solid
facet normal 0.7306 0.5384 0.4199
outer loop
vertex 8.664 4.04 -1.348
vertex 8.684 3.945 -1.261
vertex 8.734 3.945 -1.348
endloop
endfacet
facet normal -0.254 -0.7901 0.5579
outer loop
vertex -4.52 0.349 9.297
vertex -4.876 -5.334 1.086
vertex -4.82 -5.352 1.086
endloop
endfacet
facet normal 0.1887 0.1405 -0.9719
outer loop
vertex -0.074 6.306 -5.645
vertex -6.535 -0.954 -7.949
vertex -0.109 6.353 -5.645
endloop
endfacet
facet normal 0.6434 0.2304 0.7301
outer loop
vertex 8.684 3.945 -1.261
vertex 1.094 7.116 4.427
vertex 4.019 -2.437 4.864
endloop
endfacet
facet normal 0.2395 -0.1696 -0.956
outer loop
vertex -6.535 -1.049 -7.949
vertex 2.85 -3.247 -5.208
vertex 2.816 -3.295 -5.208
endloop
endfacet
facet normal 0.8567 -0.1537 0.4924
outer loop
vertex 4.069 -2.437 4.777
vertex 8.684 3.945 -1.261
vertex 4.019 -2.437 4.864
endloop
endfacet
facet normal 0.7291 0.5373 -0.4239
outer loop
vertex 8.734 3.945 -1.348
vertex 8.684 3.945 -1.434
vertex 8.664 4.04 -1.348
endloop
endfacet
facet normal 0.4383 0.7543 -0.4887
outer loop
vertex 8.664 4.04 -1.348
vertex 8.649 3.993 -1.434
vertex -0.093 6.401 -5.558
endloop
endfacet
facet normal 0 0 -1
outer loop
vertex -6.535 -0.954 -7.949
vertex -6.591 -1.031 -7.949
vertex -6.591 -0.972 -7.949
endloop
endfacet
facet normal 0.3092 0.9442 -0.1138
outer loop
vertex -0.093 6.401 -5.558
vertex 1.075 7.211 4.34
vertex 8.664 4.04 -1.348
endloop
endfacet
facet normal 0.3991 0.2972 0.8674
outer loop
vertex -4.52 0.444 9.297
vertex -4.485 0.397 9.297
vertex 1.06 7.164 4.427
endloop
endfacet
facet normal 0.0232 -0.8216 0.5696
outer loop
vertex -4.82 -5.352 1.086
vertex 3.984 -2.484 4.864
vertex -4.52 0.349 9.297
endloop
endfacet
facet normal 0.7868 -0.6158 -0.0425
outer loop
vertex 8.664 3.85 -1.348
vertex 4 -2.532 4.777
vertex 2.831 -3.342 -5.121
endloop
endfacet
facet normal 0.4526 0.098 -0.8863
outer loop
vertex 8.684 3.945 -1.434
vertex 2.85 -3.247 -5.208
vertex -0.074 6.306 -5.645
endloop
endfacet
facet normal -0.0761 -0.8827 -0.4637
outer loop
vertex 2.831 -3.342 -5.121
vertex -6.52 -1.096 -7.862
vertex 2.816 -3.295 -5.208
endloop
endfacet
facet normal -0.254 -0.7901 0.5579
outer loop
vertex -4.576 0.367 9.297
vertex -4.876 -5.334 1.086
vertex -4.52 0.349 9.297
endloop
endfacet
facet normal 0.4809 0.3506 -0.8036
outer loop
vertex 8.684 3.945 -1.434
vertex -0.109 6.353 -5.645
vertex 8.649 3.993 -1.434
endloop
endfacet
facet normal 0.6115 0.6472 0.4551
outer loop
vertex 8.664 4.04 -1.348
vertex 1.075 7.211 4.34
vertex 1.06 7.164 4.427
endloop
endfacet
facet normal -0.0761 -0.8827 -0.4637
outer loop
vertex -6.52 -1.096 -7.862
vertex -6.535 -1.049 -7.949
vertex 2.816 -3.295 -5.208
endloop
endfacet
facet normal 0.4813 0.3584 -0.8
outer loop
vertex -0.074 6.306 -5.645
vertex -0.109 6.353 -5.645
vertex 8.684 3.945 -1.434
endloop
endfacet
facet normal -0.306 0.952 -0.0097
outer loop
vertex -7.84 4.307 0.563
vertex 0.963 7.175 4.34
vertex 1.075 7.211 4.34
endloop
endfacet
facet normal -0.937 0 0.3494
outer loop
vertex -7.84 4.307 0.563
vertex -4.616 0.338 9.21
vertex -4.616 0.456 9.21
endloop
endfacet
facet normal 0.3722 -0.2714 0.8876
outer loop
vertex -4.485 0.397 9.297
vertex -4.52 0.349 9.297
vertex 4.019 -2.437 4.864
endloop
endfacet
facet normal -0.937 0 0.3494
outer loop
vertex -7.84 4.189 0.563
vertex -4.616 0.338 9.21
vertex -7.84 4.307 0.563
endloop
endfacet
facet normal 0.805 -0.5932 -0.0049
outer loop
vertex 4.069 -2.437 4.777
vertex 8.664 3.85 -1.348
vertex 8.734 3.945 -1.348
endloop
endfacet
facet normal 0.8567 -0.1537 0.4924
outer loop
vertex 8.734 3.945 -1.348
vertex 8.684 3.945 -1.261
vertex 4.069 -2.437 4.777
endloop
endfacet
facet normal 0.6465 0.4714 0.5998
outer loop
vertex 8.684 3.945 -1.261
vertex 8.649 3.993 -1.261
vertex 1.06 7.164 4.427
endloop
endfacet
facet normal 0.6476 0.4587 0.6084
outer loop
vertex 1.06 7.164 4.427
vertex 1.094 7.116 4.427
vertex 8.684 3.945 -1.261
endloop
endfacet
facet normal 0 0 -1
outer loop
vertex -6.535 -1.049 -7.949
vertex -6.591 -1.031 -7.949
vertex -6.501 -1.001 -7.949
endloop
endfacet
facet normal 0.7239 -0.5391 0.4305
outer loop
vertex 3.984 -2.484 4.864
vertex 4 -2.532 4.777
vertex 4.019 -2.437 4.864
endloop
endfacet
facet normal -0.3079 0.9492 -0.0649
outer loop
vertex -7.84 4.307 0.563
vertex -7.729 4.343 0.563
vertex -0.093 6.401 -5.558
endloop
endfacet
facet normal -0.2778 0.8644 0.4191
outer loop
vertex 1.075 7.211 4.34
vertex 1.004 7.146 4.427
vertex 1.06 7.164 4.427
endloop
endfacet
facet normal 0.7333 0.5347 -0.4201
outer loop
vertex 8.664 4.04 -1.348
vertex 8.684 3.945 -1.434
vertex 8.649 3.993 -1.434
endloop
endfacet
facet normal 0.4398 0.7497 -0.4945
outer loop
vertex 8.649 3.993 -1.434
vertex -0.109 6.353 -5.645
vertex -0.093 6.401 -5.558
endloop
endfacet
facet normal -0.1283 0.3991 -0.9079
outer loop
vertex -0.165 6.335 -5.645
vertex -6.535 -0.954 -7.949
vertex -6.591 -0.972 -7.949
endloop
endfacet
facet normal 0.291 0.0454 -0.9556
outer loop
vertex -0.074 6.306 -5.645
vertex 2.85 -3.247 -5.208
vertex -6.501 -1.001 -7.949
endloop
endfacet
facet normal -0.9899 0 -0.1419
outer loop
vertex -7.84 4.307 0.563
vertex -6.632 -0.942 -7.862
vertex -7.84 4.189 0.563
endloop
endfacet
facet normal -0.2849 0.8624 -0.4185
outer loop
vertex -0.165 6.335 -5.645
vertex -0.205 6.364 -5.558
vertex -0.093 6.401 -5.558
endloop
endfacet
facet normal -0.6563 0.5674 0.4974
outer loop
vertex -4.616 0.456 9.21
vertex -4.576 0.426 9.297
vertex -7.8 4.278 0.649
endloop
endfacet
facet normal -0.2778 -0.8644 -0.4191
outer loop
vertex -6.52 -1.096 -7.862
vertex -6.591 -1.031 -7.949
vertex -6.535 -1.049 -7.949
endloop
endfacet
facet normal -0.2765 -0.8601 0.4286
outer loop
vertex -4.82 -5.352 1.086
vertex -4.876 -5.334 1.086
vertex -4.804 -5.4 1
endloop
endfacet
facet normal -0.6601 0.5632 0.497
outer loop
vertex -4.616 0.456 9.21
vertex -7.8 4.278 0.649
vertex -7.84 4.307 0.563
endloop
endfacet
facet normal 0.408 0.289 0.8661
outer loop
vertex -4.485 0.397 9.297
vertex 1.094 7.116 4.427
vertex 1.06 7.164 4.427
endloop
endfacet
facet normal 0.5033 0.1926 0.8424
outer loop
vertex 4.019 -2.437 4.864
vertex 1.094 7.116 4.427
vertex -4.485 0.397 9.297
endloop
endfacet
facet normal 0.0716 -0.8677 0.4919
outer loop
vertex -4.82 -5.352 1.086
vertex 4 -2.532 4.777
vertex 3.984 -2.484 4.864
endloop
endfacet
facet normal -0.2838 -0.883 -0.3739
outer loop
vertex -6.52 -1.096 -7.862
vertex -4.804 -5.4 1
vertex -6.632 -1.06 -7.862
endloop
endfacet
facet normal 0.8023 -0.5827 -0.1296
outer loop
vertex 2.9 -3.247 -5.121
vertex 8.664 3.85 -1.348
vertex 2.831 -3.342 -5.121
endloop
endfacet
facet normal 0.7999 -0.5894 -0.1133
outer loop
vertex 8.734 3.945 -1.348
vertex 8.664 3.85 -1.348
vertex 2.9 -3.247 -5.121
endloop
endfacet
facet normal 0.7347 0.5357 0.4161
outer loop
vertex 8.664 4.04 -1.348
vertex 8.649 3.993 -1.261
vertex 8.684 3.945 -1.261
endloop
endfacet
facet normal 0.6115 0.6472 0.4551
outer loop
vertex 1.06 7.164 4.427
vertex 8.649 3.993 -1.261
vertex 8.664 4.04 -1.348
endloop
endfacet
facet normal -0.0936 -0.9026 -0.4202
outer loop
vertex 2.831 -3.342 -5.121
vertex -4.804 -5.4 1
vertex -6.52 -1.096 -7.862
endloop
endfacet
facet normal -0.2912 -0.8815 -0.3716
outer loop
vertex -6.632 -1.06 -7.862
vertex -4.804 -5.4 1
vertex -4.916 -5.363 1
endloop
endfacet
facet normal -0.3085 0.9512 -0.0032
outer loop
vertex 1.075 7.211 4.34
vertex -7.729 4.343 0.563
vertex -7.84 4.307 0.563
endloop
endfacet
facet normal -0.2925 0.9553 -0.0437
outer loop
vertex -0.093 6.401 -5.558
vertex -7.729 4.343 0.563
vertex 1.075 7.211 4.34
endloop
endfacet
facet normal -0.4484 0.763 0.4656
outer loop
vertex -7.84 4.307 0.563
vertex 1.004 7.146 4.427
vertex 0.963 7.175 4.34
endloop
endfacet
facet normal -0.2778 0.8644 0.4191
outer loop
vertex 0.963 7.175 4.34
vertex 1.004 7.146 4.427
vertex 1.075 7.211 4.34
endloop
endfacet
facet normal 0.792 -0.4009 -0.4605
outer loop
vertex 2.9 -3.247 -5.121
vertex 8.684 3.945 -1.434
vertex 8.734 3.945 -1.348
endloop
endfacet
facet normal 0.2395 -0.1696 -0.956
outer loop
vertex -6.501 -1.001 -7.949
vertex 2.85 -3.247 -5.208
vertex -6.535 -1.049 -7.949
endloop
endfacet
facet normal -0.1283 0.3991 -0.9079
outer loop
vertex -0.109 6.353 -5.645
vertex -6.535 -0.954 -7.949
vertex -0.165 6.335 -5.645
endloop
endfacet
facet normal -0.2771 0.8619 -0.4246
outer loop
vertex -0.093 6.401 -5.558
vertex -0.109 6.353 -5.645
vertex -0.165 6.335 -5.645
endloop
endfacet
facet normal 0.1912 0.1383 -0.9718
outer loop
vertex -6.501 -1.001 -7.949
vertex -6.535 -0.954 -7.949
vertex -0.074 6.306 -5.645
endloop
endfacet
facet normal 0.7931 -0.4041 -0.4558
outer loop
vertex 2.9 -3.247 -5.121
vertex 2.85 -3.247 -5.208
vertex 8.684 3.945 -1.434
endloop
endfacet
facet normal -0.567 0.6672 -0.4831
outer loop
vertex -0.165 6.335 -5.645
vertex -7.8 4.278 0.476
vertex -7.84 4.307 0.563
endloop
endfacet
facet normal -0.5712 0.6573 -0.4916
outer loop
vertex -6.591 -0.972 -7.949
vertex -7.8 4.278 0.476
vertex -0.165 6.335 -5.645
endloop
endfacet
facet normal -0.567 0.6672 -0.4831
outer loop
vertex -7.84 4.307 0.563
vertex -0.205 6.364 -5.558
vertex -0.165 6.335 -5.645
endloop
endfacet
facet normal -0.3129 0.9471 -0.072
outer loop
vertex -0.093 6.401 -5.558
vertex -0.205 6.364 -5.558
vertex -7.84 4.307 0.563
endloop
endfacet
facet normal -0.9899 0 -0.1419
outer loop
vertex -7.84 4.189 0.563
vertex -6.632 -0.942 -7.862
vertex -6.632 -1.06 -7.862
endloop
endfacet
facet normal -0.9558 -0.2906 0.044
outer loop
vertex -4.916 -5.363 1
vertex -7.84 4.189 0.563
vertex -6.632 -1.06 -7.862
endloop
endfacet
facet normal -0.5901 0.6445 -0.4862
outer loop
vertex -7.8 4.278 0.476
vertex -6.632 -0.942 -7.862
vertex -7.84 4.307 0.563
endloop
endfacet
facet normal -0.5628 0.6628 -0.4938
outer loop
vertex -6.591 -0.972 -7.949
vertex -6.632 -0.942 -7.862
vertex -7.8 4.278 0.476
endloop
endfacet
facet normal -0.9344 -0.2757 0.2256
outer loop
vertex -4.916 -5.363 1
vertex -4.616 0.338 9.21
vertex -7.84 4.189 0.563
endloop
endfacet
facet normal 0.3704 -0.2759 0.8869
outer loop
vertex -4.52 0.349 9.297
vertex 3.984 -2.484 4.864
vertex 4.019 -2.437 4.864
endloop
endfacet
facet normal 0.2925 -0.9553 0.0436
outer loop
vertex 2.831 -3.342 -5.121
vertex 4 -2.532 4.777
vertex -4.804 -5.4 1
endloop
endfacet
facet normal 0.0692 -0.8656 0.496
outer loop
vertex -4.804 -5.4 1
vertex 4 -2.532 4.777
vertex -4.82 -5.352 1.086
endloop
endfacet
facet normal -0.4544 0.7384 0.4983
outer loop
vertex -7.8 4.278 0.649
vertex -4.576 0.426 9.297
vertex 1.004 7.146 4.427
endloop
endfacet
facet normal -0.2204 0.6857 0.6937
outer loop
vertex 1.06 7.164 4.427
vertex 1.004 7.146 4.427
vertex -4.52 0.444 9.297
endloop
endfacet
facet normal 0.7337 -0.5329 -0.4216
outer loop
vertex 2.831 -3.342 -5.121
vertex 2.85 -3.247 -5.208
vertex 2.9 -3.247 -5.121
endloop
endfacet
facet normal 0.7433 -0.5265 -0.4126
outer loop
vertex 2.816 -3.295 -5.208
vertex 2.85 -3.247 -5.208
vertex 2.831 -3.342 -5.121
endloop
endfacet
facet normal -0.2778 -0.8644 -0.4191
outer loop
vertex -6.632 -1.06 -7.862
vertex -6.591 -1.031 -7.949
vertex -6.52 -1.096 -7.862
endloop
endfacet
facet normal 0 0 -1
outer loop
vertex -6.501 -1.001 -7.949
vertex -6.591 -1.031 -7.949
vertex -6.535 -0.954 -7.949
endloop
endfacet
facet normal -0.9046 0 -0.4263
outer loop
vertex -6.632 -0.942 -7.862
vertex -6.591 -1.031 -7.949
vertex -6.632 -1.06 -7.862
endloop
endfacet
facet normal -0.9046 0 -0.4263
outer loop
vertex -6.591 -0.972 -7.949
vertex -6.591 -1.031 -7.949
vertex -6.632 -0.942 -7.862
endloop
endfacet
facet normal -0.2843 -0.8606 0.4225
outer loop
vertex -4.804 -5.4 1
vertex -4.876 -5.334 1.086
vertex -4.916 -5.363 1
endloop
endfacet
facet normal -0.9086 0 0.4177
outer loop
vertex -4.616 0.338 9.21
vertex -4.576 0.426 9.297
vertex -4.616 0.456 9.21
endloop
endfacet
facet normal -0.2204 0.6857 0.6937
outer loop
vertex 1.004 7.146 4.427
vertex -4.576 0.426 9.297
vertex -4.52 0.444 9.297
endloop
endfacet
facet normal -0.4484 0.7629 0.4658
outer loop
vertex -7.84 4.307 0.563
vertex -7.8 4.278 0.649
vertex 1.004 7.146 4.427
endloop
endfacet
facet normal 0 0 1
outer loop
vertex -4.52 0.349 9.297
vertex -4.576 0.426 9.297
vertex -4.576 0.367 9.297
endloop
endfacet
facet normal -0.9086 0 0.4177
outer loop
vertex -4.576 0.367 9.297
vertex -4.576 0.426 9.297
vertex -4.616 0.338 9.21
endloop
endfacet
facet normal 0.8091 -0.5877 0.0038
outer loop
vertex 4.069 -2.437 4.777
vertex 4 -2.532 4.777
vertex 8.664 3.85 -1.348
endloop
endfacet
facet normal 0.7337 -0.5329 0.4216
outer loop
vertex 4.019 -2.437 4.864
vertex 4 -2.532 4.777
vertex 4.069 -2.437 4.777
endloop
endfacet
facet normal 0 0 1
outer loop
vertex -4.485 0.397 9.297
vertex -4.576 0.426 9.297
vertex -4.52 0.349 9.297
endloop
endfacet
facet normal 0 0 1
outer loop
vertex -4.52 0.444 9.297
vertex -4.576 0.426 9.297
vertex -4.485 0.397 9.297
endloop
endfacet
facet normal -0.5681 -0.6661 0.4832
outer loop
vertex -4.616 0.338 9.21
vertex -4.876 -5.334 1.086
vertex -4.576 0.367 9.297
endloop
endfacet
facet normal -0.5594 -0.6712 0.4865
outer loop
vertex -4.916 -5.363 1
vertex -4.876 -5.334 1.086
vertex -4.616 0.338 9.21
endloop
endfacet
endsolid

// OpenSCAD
// Auto-generated OpenSCAD file

    inner_points = 10*[[0.3968794289832836, -0.24366904809970863, 0.47769744652866364], [0.1044370337410087, 0.7116152041618212, 0.43400027446809336], [0.28001866757022104, -0.32472141302800633, -0.512137931997225], [-0.012423727672053866, 0.6305628392335235, -0.5558351040577953], [-0.483509439683674, -0.5304611105401444, 0.0999862435594168], [-0.7759518349259489, 0.4248231417213853, 0.05628907149884649], [-0.45353704140965617, 0.039673656440986374, 0.9209905083602004], [-0.6550920403237519, -0.10012099428325462, -0.7862229842742783], [0.8633541457398265, 0.39452214456670354, -0.13476752408592219]];

    outer_points = 10*[[0.5060778848187576, -0.5313859144211572, 0.21177232535318735], [0.4838884138968741, 0.07018910183659147, -0.5867357379715961], [-0.4935362337764729, -0.5313859144211572, 0.2395502645330591], [-0.5157257046983563, 0.07018910183659147, -0.5589577987917242], [0.020742555340540487, 0.1604093044556914, 0.7464395051009286], [-0.0014469155813429608, 0.76198432071344, -0.05206855822385477], [0.8703596761375976, 0.39772341860368887, 0.275448253298233], [-0.8537196482801497, 0.39772341860368887, 0.3233581114365443], [-0.016640027857447785, -0.7954468372073777, -0.5988063647347773]];

    // Convex hull for inner set (I)
    module inner_hull() {
        hull() {
            for (p = inner_points) {
                translate(p) sphere(r=0.1);
            }
        }
    }

    // Convex hull for outer set (O) minus inner hull (O \ I)
    module outer_minus_inner() {
        difference() {
            hull() {
                for (p = outer_points) {
                    translate(p) sphere(r=0.1);
                }
            }
            inner_hull(); // Subtract inner hull
        }
    }

    // Convex hull for outer set (O) minus all translated inner hulls
    module outer_minus_AllTranslationInner() {
        difference() {
            hull() {
                for (p = outer_points) {
                    translate(p) sphere(r=0.1);
                }
            }
            hull() {
                translate([0,0,50]) inner_hull();
                translate([0,0,-50]) inner_hull();
            }; // Subtract translated inner hulls
        }
    }

    // Difference between outer_minus_inner and outer_minus_AllTranslationInner
    module outer_minus_inner_diff() {
        difference() {
            // Outer minus inner
            difference() {
                hull() {
                    for (p = outer_points) {
                        translate(p) sphere(r=0.1);
                    }
                }
                inner_hull();
            }

            // Subtract Outer minus AllTranslationInner
            difference() {
                hull() {
                    for (p = outer_points) {
                        translate(p) sphere(r=0.1);
                    }
                }
                hull() {
                    translate([0,0,50]) inner_hull();
                    translate([0,0,-50]) inner_hull();
                };
            }
        }
    }

    // Rendering all with colors applied
    color([1, 0, 0, 0.5]) inner_hull(); // Transparent red
    
